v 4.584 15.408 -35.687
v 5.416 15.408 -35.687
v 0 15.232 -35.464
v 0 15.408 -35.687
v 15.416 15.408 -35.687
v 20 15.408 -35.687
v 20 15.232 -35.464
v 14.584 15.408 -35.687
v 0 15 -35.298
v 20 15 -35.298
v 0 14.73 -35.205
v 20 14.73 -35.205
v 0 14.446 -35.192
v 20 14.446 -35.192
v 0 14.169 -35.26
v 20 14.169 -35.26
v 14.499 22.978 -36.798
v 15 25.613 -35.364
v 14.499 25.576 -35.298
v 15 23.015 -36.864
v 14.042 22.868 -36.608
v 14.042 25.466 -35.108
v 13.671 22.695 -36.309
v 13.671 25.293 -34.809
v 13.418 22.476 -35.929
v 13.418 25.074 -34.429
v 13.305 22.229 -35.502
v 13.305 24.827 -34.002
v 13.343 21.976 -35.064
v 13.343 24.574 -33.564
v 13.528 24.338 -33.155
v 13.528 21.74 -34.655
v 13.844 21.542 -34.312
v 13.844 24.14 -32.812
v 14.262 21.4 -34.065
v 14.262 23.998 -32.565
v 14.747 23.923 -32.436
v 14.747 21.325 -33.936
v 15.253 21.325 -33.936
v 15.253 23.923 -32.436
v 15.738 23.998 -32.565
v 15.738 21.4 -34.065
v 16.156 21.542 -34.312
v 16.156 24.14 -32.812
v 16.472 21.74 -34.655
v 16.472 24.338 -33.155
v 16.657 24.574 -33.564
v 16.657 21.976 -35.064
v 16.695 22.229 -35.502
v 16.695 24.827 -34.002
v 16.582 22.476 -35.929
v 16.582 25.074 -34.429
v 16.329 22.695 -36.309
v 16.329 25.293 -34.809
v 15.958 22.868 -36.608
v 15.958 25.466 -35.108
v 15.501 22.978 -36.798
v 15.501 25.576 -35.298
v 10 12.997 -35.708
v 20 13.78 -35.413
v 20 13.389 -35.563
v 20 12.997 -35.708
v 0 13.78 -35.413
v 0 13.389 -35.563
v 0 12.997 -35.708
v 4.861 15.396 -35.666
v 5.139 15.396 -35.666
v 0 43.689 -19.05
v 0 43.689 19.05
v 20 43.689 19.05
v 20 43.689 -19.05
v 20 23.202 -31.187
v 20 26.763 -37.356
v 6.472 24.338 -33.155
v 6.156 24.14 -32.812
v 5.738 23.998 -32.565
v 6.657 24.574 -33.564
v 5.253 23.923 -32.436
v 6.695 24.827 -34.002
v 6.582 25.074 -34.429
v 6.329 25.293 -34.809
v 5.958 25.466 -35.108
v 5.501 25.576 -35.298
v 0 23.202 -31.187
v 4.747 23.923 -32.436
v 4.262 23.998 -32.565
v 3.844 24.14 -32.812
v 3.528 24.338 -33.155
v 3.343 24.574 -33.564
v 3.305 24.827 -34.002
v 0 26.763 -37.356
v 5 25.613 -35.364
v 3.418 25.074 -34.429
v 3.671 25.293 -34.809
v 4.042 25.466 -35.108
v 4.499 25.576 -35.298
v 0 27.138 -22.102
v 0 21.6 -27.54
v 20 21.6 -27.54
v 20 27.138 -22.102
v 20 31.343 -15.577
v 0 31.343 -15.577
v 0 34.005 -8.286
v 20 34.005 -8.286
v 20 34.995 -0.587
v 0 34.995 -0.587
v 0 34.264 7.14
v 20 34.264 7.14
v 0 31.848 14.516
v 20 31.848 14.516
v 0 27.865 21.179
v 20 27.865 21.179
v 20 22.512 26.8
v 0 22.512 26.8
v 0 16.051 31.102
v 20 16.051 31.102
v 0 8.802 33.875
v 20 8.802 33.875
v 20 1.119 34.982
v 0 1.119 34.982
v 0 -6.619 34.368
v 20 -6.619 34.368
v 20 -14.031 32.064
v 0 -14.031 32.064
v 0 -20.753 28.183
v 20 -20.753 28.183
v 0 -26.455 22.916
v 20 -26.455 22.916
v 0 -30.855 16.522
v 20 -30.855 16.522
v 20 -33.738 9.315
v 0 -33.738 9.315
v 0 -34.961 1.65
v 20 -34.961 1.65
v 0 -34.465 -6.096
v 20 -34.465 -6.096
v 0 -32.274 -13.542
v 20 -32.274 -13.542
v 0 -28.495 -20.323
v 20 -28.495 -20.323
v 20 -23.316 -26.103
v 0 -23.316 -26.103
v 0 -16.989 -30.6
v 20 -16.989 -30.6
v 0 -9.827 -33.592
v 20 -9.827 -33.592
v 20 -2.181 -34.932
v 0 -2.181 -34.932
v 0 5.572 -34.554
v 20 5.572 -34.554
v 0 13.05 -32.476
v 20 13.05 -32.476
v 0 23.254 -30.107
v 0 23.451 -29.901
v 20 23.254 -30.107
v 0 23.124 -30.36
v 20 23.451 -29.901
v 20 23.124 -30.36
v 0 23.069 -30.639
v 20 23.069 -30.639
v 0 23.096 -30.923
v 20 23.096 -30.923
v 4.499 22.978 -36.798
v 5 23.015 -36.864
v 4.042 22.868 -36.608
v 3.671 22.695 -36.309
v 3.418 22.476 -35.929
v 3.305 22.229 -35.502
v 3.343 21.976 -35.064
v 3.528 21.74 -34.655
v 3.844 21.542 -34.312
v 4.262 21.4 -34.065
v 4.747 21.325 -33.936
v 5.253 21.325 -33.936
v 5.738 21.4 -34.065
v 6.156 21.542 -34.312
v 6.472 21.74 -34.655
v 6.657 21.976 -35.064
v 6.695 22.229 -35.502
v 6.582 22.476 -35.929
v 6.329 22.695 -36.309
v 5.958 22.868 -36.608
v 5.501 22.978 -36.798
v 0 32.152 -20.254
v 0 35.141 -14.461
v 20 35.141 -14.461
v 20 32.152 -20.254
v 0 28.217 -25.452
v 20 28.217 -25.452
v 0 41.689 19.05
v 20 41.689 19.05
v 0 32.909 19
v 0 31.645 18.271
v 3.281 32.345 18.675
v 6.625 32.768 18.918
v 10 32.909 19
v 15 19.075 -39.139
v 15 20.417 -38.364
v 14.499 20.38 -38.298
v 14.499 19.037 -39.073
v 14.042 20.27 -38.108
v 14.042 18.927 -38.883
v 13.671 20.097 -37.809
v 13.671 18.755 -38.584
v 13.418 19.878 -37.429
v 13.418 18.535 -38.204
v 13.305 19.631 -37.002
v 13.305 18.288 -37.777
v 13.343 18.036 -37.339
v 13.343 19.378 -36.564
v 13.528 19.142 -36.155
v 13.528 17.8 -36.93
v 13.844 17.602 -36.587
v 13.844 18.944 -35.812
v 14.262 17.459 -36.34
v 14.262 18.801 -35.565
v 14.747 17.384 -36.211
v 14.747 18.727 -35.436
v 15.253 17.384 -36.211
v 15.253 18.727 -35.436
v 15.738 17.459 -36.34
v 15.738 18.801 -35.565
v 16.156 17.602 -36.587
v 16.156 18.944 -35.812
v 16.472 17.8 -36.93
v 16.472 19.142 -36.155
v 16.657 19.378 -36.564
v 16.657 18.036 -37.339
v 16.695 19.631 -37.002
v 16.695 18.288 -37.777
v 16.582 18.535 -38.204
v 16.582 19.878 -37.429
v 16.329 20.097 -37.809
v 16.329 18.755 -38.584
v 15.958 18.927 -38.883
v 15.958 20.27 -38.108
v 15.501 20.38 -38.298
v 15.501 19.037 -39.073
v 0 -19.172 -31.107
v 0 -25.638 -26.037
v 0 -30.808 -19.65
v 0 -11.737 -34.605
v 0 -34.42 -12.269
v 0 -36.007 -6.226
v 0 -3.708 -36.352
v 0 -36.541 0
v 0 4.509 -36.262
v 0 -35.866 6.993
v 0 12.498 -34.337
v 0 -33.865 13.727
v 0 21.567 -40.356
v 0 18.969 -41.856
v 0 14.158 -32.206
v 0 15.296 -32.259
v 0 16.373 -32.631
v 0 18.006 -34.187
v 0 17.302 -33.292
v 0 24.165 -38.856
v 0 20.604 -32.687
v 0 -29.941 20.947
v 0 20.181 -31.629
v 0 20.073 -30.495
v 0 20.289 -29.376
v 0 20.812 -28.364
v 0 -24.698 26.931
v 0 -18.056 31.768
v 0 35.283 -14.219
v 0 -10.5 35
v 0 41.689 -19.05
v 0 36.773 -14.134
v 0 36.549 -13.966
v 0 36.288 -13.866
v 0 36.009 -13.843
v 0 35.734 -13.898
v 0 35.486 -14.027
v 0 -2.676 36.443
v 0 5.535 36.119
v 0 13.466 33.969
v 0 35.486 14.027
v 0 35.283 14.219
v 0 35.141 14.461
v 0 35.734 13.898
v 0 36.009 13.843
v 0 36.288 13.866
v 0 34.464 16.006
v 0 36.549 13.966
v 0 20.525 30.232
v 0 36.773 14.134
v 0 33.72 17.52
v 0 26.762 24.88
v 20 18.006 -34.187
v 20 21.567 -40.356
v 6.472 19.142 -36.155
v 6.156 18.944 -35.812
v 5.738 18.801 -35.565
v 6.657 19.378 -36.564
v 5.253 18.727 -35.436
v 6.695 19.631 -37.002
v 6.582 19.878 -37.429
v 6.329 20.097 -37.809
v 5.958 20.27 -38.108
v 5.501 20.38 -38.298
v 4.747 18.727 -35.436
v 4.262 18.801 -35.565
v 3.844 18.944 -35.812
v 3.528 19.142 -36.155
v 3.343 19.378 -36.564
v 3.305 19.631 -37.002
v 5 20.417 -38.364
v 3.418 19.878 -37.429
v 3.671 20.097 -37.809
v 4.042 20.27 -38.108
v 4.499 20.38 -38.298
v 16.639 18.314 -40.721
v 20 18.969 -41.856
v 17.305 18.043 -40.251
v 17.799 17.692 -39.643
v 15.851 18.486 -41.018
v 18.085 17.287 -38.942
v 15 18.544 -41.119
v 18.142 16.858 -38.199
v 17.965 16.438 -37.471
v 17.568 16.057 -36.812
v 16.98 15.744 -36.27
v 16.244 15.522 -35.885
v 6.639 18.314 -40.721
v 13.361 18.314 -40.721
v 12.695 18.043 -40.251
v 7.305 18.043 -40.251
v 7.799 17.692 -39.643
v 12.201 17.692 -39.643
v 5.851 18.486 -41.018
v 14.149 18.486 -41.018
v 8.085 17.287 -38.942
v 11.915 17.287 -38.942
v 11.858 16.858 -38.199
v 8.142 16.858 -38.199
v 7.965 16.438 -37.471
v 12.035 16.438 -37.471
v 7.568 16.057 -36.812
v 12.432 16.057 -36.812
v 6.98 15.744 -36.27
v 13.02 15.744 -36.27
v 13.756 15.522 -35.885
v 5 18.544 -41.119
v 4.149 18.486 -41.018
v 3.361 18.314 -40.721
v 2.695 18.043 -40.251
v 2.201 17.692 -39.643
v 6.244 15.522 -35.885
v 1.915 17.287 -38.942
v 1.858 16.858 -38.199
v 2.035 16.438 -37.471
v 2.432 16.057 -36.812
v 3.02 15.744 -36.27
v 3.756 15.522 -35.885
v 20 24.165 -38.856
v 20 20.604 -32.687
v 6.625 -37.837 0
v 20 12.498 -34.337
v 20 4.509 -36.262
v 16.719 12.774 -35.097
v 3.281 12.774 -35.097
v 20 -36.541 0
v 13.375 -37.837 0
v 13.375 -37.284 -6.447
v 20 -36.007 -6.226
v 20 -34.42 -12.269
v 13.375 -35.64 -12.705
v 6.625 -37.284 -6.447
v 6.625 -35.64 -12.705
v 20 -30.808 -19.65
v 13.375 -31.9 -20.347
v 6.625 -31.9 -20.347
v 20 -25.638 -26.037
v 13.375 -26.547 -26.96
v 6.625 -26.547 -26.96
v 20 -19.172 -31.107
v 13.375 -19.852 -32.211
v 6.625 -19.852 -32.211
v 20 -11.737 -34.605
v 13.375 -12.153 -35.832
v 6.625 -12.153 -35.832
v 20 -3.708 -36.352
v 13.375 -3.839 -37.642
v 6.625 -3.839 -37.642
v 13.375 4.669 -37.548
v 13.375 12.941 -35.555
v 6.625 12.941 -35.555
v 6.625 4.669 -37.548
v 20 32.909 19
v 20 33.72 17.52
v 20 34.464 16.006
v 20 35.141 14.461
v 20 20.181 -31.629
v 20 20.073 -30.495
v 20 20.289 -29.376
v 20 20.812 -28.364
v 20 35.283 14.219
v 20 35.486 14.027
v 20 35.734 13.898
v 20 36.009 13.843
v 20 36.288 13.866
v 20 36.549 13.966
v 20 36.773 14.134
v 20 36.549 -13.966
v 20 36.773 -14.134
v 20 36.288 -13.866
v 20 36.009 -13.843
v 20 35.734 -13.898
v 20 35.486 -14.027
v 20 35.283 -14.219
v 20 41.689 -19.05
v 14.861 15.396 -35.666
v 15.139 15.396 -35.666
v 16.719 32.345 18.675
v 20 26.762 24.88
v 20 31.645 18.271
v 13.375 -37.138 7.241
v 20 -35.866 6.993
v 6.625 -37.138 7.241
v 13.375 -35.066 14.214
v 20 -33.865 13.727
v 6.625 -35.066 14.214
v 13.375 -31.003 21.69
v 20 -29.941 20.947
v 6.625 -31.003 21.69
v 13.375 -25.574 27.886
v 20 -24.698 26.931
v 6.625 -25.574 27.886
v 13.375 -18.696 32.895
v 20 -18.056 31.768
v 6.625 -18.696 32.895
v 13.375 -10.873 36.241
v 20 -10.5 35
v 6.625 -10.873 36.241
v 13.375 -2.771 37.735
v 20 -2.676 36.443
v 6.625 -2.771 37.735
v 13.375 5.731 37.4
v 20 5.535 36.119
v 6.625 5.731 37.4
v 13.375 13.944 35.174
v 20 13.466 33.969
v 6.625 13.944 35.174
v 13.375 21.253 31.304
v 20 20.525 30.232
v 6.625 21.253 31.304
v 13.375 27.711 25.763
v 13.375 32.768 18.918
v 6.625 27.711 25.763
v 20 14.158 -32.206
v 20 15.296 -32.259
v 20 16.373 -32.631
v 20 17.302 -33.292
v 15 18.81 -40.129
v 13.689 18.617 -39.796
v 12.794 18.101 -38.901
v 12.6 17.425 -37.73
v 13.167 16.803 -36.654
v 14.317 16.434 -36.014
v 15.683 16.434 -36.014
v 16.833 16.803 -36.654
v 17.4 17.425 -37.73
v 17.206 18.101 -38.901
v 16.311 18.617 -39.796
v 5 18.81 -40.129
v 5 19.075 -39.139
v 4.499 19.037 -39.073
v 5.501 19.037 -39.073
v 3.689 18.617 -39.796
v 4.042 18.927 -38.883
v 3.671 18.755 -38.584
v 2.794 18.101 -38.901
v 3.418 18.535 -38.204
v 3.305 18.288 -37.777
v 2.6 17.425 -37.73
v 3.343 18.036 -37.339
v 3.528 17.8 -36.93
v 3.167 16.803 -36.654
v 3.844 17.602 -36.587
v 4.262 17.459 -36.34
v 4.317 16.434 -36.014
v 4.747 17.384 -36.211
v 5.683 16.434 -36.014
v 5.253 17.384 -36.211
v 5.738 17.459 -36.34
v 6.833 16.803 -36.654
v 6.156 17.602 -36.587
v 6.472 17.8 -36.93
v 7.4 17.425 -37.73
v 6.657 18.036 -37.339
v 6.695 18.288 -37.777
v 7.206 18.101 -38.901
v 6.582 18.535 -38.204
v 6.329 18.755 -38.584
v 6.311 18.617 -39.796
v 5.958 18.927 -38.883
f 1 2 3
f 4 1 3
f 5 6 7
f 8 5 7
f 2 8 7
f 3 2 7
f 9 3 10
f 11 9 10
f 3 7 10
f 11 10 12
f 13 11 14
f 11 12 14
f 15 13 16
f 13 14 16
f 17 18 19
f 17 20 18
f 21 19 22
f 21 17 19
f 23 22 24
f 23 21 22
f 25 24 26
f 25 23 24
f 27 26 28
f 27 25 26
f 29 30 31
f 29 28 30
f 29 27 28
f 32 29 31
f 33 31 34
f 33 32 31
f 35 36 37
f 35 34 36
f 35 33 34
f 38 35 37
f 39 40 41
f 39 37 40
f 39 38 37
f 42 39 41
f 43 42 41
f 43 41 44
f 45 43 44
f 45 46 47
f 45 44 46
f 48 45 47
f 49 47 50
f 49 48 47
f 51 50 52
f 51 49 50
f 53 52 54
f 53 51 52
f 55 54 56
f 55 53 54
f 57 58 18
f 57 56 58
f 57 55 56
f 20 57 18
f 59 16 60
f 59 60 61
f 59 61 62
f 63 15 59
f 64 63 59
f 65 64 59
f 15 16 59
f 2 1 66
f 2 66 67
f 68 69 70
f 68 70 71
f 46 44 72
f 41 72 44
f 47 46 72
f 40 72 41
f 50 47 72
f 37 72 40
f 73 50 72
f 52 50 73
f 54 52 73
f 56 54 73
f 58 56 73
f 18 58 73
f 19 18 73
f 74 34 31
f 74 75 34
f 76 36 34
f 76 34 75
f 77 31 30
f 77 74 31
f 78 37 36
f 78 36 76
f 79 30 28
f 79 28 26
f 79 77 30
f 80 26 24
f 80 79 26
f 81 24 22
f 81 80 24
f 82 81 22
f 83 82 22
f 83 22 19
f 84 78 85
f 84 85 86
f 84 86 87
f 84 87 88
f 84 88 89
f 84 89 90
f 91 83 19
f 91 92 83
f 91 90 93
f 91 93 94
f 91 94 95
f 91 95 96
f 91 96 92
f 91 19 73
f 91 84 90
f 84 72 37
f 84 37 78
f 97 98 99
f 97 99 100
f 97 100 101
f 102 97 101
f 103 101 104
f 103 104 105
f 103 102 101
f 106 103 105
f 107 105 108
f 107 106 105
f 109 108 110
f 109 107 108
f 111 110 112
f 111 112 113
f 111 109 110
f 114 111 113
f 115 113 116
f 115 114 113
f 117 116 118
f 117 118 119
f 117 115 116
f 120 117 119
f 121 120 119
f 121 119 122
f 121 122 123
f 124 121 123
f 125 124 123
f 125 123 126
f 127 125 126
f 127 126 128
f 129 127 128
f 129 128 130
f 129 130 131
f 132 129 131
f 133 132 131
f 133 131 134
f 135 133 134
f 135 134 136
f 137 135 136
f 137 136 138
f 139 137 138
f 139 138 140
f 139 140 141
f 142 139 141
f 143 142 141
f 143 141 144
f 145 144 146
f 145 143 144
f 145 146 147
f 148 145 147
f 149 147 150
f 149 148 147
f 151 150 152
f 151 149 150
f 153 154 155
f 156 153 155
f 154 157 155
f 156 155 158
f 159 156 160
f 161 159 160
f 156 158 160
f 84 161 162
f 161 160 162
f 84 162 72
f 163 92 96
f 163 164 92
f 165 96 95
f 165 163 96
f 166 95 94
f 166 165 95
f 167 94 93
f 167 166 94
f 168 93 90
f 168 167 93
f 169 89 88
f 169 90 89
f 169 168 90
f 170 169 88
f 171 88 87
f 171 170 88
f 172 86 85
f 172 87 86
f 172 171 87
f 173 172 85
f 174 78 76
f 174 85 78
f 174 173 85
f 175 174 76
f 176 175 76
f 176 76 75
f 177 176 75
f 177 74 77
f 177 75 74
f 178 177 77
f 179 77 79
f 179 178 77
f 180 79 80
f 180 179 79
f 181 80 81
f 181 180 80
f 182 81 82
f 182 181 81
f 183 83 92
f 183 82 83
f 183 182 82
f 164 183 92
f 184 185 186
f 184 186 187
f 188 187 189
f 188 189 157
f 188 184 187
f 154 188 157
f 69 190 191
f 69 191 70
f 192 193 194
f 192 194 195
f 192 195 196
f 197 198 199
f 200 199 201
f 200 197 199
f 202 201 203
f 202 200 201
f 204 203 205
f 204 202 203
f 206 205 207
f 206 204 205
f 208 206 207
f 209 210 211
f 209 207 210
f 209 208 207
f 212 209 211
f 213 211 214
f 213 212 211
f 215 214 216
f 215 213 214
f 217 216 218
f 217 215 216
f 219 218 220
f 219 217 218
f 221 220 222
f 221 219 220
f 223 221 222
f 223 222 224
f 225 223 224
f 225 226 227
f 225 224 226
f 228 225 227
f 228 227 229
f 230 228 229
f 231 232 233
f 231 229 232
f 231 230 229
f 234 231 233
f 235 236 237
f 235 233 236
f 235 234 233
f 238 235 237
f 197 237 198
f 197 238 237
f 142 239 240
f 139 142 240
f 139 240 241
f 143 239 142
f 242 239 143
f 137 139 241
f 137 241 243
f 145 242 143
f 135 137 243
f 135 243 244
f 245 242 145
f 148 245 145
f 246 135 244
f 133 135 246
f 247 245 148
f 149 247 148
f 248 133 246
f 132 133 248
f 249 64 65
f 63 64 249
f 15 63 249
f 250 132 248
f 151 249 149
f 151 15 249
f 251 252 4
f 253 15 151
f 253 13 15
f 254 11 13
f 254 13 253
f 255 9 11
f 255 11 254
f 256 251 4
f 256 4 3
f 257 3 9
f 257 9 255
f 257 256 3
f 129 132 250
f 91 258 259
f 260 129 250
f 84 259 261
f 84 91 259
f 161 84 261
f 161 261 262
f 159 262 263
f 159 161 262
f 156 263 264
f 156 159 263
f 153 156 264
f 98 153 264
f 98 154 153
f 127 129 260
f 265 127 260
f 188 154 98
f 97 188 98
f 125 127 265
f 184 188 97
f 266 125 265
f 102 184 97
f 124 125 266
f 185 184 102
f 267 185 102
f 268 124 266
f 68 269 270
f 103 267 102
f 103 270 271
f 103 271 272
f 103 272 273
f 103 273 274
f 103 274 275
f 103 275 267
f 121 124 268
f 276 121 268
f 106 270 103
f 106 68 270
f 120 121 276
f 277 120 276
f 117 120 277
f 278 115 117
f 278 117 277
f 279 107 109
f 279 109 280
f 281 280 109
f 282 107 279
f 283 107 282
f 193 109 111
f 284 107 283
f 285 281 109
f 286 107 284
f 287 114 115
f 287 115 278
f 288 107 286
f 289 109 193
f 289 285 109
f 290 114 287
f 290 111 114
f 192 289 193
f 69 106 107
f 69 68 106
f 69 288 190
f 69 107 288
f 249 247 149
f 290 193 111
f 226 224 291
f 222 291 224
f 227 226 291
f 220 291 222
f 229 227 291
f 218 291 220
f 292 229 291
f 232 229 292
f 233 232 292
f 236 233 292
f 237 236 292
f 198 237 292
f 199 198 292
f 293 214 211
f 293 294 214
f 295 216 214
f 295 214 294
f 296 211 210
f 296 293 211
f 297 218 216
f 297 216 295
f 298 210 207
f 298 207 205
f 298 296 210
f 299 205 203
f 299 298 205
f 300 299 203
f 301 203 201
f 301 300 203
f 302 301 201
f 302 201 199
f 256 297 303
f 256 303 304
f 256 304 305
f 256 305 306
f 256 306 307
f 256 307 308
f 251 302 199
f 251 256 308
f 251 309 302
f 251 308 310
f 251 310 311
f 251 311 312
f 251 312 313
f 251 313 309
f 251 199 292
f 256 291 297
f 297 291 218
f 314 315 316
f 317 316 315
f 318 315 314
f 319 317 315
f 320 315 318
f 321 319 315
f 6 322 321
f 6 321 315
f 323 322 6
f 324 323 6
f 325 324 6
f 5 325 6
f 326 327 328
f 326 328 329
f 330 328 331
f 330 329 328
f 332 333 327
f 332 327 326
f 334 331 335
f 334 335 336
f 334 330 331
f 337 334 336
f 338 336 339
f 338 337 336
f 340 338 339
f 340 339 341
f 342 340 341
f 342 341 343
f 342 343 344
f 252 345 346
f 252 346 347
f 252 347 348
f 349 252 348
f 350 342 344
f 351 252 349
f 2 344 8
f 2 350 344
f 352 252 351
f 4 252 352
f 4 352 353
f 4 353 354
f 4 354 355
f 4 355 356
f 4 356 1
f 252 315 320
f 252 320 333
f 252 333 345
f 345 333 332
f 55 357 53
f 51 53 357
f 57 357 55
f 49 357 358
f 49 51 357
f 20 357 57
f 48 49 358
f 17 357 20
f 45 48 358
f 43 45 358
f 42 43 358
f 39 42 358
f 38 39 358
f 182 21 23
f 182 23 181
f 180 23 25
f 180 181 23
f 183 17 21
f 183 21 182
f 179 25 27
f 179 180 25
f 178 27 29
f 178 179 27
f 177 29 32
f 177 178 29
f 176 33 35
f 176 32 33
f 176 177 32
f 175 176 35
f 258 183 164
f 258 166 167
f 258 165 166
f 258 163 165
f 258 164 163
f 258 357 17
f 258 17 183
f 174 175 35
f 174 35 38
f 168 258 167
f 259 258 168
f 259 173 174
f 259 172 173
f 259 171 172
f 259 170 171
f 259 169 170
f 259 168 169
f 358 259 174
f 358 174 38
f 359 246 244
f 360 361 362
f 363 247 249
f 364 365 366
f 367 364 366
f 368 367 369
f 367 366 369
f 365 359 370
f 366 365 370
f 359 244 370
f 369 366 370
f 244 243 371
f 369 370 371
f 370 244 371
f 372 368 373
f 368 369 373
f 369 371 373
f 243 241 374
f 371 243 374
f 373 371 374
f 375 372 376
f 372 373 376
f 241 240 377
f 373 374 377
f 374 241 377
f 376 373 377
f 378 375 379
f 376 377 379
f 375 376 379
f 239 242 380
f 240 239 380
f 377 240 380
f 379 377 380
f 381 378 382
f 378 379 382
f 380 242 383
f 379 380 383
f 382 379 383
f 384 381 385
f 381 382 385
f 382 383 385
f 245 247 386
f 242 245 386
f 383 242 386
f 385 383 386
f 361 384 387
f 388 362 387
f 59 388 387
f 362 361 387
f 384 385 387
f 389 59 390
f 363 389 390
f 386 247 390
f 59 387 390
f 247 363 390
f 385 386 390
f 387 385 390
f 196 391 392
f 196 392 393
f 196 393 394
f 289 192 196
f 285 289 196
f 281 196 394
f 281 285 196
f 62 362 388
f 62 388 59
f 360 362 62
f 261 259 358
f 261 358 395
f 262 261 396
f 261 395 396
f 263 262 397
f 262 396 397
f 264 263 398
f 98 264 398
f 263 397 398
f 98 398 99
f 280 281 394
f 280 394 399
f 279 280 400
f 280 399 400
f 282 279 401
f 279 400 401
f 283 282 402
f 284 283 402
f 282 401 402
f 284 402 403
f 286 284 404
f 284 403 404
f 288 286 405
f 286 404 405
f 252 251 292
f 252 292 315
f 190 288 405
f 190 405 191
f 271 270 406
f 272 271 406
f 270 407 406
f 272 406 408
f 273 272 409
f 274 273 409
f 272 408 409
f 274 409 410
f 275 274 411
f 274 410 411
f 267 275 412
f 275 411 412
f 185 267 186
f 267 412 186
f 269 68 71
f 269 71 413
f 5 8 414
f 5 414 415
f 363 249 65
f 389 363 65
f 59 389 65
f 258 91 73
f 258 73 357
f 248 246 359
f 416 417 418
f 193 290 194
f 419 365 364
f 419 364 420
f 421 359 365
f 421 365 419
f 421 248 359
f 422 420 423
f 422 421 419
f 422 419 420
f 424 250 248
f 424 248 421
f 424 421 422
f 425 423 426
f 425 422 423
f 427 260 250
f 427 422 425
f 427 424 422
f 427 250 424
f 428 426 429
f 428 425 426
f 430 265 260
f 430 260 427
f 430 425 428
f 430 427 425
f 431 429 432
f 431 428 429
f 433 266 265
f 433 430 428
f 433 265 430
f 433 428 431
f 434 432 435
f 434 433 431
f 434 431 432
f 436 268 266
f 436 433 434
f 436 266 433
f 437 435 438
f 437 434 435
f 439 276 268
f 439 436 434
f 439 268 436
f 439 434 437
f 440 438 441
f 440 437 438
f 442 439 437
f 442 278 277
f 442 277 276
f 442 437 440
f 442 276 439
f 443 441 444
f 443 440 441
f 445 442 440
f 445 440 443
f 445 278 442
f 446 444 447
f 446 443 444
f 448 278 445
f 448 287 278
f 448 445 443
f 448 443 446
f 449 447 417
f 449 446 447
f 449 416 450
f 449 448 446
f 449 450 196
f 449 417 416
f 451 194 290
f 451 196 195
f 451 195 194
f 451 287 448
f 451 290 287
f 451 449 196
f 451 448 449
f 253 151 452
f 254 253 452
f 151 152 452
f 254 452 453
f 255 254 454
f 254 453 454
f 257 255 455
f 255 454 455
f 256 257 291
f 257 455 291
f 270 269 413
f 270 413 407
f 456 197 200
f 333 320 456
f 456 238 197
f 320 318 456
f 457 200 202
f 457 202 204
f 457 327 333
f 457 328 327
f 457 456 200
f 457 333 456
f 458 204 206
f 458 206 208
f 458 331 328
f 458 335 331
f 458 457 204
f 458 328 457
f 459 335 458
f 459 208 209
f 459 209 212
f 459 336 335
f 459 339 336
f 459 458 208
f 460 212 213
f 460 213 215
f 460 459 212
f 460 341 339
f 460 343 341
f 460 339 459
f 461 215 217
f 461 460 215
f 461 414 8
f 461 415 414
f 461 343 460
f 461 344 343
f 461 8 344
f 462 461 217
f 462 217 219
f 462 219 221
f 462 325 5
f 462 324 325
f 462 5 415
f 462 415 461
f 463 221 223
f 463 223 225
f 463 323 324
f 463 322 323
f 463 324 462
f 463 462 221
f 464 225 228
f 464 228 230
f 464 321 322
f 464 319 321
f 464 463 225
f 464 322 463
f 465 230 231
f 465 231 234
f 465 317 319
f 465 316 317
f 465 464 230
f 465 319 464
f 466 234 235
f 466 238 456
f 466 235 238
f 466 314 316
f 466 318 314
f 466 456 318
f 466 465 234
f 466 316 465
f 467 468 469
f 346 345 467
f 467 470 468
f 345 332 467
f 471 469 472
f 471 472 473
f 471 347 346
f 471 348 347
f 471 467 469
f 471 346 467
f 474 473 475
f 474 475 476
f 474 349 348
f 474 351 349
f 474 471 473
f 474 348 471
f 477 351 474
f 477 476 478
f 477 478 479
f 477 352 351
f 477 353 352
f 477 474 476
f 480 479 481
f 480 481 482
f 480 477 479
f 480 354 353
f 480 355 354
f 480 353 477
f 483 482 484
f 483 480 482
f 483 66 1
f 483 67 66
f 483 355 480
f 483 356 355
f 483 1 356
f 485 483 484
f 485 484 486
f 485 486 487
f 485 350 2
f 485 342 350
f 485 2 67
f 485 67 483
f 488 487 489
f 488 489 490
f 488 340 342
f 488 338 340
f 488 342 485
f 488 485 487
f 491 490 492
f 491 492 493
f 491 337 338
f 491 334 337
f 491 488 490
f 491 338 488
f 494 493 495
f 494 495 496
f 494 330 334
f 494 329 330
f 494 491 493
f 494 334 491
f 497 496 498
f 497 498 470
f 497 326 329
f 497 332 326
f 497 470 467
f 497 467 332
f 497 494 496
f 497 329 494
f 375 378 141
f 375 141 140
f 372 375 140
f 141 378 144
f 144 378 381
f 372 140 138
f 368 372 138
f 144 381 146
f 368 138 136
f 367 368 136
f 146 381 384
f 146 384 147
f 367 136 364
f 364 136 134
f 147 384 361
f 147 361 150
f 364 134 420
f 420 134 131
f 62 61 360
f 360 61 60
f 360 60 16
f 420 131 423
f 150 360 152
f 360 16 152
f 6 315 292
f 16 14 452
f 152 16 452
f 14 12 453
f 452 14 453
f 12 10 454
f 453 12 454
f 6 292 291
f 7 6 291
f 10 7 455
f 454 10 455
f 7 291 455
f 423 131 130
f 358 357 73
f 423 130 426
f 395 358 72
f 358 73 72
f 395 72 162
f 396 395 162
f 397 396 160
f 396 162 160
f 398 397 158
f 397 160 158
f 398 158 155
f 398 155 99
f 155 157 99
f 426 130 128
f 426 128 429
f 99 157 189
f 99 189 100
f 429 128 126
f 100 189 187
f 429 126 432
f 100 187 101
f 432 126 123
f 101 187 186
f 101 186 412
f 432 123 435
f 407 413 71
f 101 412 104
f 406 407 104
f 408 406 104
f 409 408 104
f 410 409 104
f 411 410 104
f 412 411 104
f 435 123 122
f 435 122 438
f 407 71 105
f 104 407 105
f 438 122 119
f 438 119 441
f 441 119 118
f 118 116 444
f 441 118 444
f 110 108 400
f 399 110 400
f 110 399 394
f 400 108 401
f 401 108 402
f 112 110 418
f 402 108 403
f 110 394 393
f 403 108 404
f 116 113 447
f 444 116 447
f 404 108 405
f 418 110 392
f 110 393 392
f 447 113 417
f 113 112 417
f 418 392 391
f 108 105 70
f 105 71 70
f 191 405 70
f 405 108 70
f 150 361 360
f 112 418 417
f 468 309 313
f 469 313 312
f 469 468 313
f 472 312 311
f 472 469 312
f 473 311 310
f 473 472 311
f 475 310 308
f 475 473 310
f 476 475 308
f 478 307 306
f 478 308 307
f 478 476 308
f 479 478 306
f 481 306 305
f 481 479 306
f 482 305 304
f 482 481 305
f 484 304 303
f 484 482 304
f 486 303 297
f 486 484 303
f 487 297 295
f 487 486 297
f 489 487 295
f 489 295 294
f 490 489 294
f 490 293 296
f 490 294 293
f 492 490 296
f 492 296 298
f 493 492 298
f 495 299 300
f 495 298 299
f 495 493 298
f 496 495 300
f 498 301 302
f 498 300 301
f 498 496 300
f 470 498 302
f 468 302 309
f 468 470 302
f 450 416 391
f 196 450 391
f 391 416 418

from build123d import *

# Parameters (mm, degrees)
BOSS_EXTRUDE1_DEPTH                          = 20
FILLET1_R                                    = 1
FILLET2_R                                    = 4
CSK_FOR_M3_COUNTERSUNK_FLAT_HEAD_SCR_2_COUNT = 2
CSK_FOR_M3_COUNTERSUNK_FLAT_HEAD_SCR_2_PITCH = 10
CUT_REVOLVE1_ANGLE                           = 110
CUT_REVOLVE1_OTHER_WAY_ANGLE                 = 150


with BuildPart() as part:
    # Sketch1 → Boss-Extrude1 (new body)
    with BuildSketch(Plane(origin=(0, 0, 0), x_dir=(0, 0, -1), z_dir=(1, 0, 0))):
        with BuildLine():
            Line((-19.05, 43.688898834), (19.05, 43.688898834))
            Line((19.05, 43.688898834), (19.05, 41.688898834))
            Line((19.05, 41.688898834), (13.05, 35.688898834))
            ThreePointArc((13.05, 35.688898834), (22.67902305, 30.490357714), (30.427400447, 22.763420262))
            Line((30.427400447, 22.763420262), (37.355603678, 26.763420262))
            Line((37.355603678, 26.763420262), (38.855603678, 24.16534405))
            Line((38.855603678, 24.16534405), (29.533039808, 18.782959291))
            ThreePointArc((29.533039808, 18.782959291), (-30.310889132, -17.5), (31.033039808, 16.184883079))
            Line((31.033039808, 16.184883079), (40.355603678, 21.567267839))
            Line((40.355603678, 21.567267839), (41.855603678, 18.969191628))
            Line((41.855603678, 18.969191628), (34.927400447, 14.969191628))
            ThreePointArc((34.927400447, 14.969191628), (-15.065912825, -34.885788951), (-13.05, 35.688898834))
            Line((-13.05, 35.688898834), (-19.05, 41.688898834))
            Line((-19.05, 41.688898834), (-19.05, 43.688898834))
        make_face()
    extrude(amount=BOSS_EXTRUDE1_DEPTH)

    # Fillet1
    fillet1_edges = [part.edges().sort_by_distance(p)[0] for p in [
        (10, 35.688898834, 13.05),
        (10, 35.688898834, -13.05),
        (10, 22.763420262, -30.427400447),
        (10, 14.969191628, -34.927400447),
    ]]
    fillet(fillet1_edges, radius=FILLET1_R)

    # Fillet2
    fillet2_edges = [part.edges().sort_by_distance(p)[0] for p in [
        (10, 18.782959291, -29.533039808),
        (10, 16.184883079, -31.033039808),
    ]]
    fillet(fillet2_edges, radius=FILLET2_R)

    # Sketch3 → CSK for M3 Countersunk Flat Head Screw1 (revolve, cut)
    with BuildSketch(Plane(origin=(15, 16.969191628, -38.391502063), x_dir=(0, 0.49999999999999817, -0.8660254037844398), z_dir=(1, 0, 0))):
        Polygon((0, 0), (0, 61.335696254), (1.7, 61.335696254), (1.7, 1.45), (3.15, 0), align=None)
    csk_for_m3_countersunk_flat_head_screw1 = revolve(axis=Axis((15, 11.469930314, -41.566502063), (0, 0.8660254037844398, 0.4999999999999981)), mode=Mode.SUBTRACT)

    # CSK for M3 Countersunk Flat Head Scr 2: CSK for M3 Countersunk Flat Head Screw1 ×2
    with Locations(*[(-i * CSK_FOR_M3_COUNTERSUNK_FLAT_HEAD_SCR_2_PITCH, 0, 0) for i in range(1, CSK_FOR_M3_COUNTERSUNK_FLAT_HEAD_SCR_2_COUNT)]):
        add(csk_for_m3_countersunk_flat_head_screw1, mode=Mode.SUBTRACT)

    # Sketch4 → Cut-Revolve1 (revolve, cut)
    with BuildSketch(Plane.XY):
        with BuildLine():
            Line((-8.002699019, -33.015043362), (-8.002699019, -46))
            Line((-8.002699019, -46), (28, -46))
            Line((28, -46), (28, -33.01666204))
            ThreePointArc((28, -33.01666204), (9.998426404, -37.999999965), (-8.002699019, -33.015043362))
        make_face()
    revolve(axis=Axis((-3.558727933, 0, 0), (1, 0, 0)), revolution_arc=CUT_REVOLVE1_ANGLE, mode=Mode.SUBTRACT)

    # Sketch4 → Cut-Revolve1 other way (revolve, cut)
    with BuildSketch(Plane.XY):
        with BuildLine():
            Line((-8.002699019, -33.015043362), (-8.002699019, -46))
            Line((-8.002699019, -46), (28, -46))
            Line((28, -46), (28, -33.01666204))
            ThreePointArc((28, -33.01666204), (9.998426404, -37.999999965), (-8.002699019, -33.015043362))
        make_face()
    revolve(axis=Axis((-3.558727933, 0, 0), (-1, 0, 0)), revolution_arc=CUT_REVOLVE1_OTHER_WAY_ANGLE, mode=Mode.SUBTRACT)


solid = part.part
